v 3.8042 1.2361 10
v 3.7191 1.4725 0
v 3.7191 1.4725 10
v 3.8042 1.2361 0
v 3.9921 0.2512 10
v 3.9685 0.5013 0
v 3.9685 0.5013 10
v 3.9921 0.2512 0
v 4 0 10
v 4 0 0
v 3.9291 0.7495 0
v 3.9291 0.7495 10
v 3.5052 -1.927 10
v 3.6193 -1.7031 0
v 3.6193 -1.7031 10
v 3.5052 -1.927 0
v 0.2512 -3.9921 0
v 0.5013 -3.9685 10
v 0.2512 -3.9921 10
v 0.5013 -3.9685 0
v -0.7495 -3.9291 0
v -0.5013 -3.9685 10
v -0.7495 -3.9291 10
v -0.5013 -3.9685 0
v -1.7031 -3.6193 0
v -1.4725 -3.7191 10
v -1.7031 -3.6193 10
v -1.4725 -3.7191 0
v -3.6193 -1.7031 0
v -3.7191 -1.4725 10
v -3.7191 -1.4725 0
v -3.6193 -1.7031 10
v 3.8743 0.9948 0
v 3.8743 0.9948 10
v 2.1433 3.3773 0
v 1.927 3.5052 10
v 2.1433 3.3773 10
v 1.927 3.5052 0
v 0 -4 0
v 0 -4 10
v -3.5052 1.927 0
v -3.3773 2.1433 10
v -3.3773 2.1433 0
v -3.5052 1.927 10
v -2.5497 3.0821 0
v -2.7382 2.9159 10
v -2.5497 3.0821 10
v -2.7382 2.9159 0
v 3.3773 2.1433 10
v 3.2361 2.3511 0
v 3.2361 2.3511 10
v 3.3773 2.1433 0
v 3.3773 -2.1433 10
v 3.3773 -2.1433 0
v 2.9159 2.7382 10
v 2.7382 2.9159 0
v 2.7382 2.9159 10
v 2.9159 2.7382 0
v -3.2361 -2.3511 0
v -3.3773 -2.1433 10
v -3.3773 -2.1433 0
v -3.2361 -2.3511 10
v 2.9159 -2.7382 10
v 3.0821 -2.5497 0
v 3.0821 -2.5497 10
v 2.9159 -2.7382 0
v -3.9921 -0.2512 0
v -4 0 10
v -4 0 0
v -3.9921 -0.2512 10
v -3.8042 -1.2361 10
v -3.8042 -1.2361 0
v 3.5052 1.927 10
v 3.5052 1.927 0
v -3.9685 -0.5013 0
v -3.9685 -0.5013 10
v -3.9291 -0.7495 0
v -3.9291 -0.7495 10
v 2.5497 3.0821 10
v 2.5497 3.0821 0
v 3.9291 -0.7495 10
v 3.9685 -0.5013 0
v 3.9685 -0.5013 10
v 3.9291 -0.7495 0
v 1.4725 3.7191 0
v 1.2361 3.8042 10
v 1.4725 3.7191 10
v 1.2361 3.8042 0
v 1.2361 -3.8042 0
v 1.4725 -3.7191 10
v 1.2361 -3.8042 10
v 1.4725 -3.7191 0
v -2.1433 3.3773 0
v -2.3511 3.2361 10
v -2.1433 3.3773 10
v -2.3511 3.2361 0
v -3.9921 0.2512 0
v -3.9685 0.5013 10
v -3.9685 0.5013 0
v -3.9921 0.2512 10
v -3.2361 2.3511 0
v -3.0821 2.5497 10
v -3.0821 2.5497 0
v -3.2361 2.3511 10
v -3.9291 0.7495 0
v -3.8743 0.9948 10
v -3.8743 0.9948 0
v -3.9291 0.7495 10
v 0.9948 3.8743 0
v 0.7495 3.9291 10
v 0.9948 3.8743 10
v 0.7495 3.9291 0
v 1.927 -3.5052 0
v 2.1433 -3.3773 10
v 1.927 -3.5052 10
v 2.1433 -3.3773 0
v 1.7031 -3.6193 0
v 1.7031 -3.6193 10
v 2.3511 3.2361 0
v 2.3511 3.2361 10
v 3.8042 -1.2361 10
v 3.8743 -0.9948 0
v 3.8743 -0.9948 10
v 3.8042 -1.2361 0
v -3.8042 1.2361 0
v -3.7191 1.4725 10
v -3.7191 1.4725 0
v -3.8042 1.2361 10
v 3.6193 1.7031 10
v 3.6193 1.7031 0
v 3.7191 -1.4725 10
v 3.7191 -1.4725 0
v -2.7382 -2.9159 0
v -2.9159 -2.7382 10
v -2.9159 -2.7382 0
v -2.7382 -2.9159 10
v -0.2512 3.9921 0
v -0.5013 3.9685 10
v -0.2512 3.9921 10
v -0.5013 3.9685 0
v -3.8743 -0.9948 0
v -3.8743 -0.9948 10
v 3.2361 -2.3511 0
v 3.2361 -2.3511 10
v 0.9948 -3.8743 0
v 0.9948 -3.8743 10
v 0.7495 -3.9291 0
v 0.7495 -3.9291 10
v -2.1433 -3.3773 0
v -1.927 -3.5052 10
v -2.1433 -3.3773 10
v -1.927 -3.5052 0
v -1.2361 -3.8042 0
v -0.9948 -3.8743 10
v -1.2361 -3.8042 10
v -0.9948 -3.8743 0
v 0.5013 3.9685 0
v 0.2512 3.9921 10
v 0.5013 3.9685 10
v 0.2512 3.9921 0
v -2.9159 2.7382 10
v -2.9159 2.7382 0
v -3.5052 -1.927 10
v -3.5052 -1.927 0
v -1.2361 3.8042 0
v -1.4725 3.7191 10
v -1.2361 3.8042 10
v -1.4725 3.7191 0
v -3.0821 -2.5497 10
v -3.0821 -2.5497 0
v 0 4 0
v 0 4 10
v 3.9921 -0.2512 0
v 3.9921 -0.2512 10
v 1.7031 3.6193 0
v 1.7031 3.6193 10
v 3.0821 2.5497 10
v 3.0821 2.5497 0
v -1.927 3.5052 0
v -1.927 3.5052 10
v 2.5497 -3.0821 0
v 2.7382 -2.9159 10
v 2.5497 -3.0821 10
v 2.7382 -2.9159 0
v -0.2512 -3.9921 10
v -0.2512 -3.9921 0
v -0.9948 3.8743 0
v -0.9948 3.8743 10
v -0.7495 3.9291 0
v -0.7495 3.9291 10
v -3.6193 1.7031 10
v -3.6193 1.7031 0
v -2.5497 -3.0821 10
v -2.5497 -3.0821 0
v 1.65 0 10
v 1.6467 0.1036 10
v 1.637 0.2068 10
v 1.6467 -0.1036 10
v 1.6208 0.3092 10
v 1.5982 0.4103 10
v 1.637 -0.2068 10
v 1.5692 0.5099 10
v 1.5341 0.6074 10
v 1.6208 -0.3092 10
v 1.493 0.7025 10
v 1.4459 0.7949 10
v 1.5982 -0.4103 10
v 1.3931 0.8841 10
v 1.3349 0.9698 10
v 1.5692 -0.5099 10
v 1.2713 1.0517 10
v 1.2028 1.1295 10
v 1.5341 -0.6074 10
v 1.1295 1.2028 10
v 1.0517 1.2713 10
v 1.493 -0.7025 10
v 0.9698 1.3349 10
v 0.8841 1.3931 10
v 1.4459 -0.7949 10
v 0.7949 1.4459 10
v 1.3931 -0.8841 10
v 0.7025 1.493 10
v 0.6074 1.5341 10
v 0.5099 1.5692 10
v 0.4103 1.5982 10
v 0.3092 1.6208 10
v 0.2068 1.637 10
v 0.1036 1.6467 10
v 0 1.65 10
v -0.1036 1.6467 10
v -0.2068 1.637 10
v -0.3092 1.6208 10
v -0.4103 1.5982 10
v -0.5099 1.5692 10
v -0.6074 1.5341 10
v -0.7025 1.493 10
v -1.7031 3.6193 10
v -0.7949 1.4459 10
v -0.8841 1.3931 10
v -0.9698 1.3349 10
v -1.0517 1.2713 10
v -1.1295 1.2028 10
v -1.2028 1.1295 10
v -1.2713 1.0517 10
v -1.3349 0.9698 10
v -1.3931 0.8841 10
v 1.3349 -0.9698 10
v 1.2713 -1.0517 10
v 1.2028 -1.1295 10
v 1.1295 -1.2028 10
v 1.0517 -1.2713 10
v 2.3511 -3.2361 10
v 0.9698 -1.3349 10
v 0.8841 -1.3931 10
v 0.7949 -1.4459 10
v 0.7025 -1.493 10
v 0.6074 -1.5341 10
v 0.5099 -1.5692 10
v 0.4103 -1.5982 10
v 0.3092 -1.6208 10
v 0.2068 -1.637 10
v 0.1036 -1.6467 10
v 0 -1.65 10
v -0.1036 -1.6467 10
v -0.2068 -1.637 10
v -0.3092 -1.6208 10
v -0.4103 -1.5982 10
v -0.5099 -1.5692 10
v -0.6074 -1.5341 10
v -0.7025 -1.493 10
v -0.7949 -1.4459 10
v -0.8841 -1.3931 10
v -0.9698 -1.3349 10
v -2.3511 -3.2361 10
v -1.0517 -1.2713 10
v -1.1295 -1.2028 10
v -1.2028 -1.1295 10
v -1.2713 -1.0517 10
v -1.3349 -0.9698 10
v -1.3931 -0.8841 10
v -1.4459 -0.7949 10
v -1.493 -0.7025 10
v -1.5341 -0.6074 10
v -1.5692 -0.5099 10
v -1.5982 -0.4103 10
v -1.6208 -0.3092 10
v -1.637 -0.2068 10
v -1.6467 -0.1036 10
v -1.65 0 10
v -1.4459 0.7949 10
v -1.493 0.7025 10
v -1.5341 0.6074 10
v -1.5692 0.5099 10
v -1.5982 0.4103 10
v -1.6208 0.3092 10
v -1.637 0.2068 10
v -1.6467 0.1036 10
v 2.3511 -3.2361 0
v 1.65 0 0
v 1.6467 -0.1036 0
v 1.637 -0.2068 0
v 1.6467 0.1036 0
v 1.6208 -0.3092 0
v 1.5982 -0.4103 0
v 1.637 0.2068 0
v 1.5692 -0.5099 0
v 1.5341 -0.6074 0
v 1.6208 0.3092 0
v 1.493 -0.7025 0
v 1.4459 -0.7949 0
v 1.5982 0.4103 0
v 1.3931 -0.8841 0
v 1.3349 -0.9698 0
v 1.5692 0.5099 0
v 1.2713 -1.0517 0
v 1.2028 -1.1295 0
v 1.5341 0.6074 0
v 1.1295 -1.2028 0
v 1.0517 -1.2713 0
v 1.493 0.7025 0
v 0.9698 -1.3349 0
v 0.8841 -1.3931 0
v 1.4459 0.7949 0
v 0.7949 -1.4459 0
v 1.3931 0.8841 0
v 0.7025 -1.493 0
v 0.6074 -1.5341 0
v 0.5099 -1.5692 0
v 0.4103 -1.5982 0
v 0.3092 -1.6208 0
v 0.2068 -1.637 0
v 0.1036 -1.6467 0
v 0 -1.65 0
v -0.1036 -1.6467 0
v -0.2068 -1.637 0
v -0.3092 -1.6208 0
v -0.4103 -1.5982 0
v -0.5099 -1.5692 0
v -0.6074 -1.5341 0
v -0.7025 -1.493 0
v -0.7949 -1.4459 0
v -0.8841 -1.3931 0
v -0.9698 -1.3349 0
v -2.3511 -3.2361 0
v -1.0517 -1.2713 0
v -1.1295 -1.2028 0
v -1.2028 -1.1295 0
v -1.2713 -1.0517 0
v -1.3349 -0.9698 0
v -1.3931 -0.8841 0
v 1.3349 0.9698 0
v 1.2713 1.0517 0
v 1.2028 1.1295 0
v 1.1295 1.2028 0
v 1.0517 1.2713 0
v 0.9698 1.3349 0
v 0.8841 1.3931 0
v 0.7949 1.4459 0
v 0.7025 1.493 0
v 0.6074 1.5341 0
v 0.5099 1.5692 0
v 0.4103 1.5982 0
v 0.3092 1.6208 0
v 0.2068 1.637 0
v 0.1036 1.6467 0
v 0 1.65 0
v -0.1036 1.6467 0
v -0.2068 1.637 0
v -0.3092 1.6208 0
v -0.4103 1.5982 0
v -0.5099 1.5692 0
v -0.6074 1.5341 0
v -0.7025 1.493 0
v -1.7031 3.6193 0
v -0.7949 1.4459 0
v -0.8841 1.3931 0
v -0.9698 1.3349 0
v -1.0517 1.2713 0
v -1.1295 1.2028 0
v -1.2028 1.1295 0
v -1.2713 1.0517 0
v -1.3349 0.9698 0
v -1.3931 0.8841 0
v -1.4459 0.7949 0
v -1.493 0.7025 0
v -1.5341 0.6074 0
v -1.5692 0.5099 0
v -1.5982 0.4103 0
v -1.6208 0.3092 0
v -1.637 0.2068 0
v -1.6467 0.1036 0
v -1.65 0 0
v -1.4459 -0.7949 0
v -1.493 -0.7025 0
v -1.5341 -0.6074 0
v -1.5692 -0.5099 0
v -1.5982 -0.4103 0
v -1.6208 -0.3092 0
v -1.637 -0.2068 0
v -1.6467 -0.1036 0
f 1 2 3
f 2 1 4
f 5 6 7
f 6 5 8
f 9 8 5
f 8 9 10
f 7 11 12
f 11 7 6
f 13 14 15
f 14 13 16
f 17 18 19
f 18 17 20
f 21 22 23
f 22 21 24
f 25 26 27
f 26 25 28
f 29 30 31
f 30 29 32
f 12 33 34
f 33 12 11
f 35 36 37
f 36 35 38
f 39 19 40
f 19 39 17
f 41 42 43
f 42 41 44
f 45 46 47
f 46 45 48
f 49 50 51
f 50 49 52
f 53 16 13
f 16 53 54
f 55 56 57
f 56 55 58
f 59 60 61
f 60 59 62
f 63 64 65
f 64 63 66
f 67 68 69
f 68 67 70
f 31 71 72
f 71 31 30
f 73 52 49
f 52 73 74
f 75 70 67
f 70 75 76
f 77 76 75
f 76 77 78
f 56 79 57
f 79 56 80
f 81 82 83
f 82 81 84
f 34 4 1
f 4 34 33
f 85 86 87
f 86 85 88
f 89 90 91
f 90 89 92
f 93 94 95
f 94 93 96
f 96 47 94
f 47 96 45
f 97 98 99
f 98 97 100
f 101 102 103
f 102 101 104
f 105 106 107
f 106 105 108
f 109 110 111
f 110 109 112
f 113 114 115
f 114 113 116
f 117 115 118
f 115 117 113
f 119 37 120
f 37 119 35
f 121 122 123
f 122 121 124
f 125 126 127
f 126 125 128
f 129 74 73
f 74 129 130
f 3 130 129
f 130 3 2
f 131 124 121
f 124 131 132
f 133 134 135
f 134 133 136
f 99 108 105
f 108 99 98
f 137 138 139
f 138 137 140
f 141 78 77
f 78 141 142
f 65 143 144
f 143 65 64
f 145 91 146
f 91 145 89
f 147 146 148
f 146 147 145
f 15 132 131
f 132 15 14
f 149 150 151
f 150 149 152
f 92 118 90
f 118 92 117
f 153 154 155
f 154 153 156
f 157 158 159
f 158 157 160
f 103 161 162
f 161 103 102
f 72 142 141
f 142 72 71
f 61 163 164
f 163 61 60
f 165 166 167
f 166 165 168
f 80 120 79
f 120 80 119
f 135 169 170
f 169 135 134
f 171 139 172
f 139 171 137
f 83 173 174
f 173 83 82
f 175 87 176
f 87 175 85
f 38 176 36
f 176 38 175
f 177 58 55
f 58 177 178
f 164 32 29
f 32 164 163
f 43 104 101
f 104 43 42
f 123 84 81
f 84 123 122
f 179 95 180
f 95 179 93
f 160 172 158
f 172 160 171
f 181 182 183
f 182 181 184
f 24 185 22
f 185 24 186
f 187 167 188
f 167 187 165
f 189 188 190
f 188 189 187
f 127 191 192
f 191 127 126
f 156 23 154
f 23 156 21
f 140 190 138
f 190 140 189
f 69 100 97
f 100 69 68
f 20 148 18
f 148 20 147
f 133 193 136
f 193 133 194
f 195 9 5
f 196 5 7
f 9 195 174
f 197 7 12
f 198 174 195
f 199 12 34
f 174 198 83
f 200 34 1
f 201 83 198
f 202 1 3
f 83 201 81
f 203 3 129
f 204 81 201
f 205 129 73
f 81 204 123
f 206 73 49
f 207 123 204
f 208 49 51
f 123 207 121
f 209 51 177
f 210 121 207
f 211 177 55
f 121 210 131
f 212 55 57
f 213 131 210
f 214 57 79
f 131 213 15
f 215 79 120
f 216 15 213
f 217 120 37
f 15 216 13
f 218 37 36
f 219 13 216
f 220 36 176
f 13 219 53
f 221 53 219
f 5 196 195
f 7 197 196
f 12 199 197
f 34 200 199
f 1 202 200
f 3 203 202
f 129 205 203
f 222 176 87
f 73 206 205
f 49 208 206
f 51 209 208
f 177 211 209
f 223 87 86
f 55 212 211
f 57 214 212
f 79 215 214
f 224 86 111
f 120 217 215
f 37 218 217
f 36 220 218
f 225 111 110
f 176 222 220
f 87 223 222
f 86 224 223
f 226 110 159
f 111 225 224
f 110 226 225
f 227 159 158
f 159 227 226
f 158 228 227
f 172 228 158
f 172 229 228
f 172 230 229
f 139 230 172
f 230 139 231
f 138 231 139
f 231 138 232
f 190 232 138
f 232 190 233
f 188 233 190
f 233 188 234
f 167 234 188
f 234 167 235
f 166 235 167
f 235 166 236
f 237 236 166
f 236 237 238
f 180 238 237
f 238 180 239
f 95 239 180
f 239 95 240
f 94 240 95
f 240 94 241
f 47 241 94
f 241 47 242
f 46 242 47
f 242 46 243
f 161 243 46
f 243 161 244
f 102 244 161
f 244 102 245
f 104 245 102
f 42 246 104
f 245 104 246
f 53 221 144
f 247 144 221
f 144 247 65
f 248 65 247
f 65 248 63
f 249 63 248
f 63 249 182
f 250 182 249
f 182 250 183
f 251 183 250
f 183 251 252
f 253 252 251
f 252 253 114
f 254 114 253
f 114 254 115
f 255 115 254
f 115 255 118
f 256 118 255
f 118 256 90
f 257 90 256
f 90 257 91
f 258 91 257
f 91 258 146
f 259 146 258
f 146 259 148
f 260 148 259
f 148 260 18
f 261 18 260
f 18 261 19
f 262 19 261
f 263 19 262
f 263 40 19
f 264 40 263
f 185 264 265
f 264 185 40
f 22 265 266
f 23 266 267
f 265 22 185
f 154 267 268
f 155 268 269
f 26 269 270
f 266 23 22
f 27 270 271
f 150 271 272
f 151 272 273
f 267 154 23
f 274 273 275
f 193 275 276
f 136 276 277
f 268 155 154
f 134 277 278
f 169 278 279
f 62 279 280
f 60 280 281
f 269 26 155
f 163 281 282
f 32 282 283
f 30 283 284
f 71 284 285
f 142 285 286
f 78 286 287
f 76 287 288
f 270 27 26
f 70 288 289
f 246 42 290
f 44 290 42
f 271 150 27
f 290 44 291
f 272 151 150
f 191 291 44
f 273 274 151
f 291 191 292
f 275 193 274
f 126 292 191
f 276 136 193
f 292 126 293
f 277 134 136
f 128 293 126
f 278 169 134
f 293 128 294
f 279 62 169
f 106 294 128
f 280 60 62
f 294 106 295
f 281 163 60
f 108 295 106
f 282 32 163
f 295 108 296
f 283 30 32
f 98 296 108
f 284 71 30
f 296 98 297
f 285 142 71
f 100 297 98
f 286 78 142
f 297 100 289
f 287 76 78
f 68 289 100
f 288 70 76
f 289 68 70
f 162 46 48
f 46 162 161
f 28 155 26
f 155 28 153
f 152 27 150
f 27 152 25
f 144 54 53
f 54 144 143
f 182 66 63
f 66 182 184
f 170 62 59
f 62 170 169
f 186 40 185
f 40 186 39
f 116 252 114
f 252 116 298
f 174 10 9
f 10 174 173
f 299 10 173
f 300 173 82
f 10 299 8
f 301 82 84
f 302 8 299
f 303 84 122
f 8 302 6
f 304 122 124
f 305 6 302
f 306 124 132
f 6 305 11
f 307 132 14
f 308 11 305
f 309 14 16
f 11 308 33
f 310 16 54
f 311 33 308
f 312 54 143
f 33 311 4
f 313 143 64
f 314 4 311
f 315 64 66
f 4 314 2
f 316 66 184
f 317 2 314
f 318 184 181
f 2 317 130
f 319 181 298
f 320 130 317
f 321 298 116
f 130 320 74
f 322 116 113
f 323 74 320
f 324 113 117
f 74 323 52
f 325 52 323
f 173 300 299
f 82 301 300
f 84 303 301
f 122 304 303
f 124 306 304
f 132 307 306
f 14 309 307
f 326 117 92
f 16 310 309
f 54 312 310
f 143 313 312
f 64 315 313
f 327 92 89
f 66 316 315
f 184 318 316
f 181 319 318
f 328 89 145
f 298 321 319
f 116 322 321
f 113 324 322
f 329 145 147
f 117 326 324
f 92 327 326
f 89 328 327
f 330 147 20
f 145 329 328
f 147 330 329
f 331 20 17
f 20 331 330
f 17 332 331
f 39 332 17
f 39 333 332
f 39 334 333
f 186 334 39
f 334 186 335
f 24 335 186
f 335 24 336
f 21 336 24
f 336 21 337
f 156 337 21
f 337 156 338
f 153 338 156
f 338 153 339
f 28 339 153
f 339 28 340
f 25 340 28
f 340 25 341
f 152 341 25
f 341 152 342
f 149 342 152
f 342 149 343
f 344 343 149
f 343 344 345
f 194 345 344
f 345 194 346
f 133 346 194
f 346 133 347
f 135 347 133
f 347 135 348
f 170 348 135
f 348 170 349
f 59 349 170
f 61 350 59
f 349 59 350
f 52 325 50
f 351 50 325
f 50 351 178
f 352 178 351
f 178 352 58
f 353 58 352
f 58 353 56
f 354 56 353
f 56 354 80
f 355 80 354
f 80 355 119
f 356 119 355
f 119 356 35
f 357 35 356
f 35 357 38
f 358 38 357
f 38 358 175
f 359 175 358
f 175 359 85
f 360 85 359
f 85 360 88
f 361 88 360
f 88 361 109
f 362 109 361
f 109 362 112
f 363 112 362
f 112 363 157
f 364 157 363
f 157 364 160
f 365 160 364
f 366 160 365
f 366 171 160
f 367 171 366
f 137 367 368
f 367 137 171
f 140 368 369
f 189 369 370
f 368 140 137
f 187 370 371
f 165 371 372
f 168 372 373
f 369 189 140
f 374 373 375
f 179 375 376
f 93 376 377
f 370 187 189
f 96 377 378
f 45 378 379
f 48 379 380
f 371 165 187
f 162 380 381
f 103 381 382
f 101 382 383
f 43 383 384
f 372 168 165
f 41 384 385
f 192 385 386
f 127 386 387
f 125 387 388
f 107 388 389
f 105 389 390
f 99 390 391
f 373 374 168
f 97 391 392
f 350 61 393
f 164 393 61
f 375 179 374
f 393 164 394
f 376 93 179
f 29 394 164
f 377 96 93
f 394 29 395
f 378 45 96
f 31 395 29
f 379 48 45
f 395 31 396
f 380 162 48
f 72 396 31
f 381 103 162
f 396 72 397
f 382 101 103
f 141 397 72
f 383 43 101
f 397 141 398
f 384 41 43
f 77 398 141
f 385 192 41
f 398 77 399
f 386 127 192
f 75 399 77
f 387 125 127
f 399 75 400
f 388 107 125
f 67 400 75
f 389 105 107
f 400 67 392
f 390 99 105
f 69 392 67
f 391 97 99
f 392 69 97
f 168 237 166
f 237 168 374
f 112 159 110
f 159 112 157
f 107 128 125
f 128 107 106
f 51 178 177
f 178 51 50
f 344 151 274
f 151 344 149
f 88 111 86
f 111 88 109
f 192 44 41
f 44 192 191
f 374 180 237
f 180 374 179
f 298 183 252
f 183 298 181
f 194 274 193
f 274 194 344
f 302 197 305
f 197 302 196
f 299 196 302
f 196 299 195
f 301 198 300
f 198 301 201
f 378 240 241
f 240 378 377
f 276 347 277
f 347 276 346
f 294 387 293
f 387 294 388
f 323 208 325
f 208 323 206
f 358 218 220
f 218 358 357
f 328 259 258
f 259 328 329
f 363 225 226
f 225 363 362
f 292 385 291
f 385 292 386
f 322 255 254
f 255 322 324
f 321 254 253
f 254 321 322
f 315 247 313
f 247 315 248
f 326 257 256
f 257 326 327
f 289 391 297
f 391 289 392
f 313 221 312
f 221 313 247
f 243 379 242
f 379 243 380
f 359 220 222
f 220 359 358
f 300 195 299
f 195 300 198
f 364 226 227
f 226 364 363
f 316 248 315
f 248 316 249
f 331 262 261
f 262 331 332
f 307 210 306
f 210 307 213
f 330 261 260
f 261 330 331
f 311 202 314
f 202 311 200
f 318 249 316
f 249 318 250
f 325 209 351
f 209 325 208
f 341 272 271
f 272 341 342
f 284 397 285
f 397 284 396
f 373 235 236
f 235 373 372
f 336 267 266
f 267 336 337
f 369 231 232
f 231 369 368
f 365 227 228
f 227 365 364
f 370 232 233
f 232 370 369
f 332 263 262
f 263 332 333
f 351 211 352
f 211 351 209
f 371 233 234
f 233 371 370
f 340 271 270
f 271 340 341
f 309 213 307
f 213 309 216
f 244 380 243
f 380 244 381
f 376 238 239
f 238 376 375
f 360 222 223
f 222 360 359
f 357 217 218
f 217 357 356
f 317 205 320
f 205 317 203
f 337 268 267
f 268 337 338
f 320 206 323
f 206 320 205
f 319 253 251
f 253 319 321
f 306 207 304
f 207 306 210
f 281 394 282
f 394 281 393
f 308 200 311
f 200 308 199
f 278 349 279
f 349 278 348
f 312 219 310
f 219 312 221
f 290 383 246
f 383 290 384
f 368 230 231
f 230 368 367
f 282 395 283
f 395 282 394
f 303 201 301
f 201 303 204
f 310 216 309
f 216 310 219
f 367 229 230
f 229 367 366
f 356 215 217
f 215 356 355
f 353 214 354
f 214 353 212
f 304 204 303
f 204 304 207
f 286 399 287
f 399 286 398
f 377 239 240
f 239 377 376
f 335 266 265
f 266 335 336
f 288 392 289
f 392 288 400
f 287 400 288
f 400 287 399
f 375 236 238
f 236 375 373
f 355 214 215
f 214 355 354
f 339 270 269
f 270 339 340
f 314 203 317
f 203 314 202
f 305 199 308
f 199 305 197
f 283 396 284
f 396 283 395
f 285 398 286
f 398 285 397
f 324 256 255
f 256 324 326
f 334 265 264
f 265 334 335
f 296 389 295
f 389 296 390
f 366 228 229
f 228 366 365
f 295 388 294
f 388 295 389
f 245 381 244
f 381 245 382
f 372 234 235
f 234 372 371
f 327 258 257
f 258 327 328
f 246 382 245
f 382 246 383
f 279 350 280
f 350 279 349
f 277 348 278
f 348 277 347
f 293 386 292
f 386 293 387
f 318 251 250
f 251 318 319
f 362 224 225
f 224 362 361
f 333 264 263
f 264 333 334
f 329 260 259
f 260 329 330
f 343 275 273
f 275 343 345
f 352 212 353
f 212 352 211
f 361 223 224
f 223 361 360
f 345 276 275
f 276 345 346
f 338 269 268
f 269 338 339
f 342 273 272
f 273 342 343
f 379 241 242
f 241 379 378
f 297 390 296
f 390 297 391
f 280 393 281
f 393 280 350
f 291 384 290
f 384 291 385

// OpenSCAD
//simple pcb standoff library - By the DoomMeister

/*
Types will be through hole, captured nut, split column (with and without base)

v1 - First Release
v1.1 - Tidied Split Base
v1.2 - added support for end nut
v1.3 - Cleaned up a bit, allowing it to be used as both a customizer object and OpenSCAD library without changes (Marius Kintel <marius@kintel.net>)

This program is free software: you can redistribute it and/or modify
it under the terms of the GNU General Public License as published by
the Free Software Foundation, either version 3 of the License, or
(at your option) any later version.

This program is distributed in the hope that it will be useful,
but WITHOUT ANY WARRANTY; without even the implied warranty of
MERCHANTABILITY or FITNESS FOR A PARTICULAR PURPOSE. See the
GNU General Public License for more details.

You should have received a copy of the GNU General Public License
along with this program. If not, see <http://www.gnu.org/licenses/>.
*/

include<MCAD/metric_fastners.scad>

//>>>>>>>>>>>>>>>>>>>>>>>>>>>>>>>>>>>>>>>>>>>>>>>>>>>>>>>>>>>>>>>>>>>>>>>>>>>
//usage
//>>>>>>>>>>>>>>>>>>>>>>>>>>>>>>>>>>>>>>>>>>>>>>>>>>>>>>>>>>>>>>>>>>>>>>>>>>>
/*
pcb_stand_off(
              type="plain",  THIS IS THE TYPE OF STAND OFF plain, end_nut, split_base 
	      hex=true, 		THIS IS THE OUTSIDE SHAPE IS IT HEXAGONAL OR ROUND,NOT USED ON SPLIT TYPE
	      od = 10, 		OUTSIDE DIAMETER
	      id = 3,        THREAD SIZE FOR INNER DIAMETER, HOLE SIZE FOR SPLIT TYPE
	      len = 12, 		LENGTH, SUPPORT HEIGHT FOR SPLIT TYPE
	      cl=0.3,  		CLEARANCE
	      thk_base,		BASE THICKNESS FOR SPLIT TYPE
	      thk_pcb);		PCB THICKNESS
*/

//>>>>>>>>>>>>>>>>>>>>>>>>>>>>>>>>>>>>>>>>>>>>>>>>>>>>>>>>>>>>>>>>>>>>>>>>>>>
//Customiser Stuff
//>>>>>>>>>>>>>>>>>>>>>>>>>>>>>>>>>>>>>>>>>>>>>>>>>>>>>>>>>>>>>>>>>>>>>>>>>>>

//Plain, Retained Nut or Split Pillar With Base
Stand_Off_Type = "plain"; // [plain:Plain, end_nut:Captive Nut, split_base:Screwless]
//Round or Hex Outside
Outside_Shape = 0; // [0:Circular, 1:Hexagonal]
// in mm
Outside_Diameter = 8;
// Thread Size in mm
Inside_Diameter = 3;
// PCB Spacing
Length = 10;
// PCB hole clearance
Clearance = 0.3;
// screwless variant only
Base_Thickness = 1.5;
// screwless variant only
PCB_Thickness = 1.5;

//Thing
pcb_stand_off(type=Stand_Off_Type,
              hex=Outside_Shape,
              od = Outside_Diameter,
              id = Inside_Diameter,
              len = Length,
              cl=Clearance,
              thk_base=Base_Thickness,
              thk_pcb=PCB_Thickness);

//>>>>>>>>>>>>>>>>>>>>>>>>>>>>>>>>>>>>>>>>>>>>>>>>>>>>>>>>>>>>>>>>>>>>>>>>>>>
//draw test
//>>>>>>>>>>>>>>>>>>>>>>>>>>>>>>>>>>>>>>>>>>>>>>>>>>>>>>>>>>>>>>>>>>>>>>>>>>>
/*
spaceing = 15*1;
translate([0*spaceing,0*spaceing,0])color("red")pcb_stand_off(type="plain",hex=true, od = 10, id = 3, len = 12, cl=0.3,thk_base=3,thk_pcb=1.5);
translate([1*spaceing,0*spaceing,0])color("green")pcb_stand_off(type="end_nut",hex=false, od = 10, id = 3, len = 12, cl=0.3);
translate([1*spaceing,1*spaceing,0])color("blue")pcb_stand_off(type="split_base", od = 10, id = 3, len = 8, cl=0.3, thk_base=1.5,thk_pcb=1.5);
*/

//>>>>>>>>>>>>>>>>>>>>>>>>>>>>>>>>>>>>>>>>>>>>>>>>>>>>>>>>>>>>>>>>>>>>>>>>>>>
//outer module
//>>>>>>>>>>>>>>>>>>>>>>>>>>>>>>>>>>>>>>>>>>>>>>>>>>>>>>>>>>>>>>>>>>>>>>>>>>>

module pcb_stand_off(type="plain",hex=false, od = 8, id = 3, len = 8, cl=0.3,thk_base=3,thk_pcb=1.5)
{
    if (type=="plain") {
	if (hex) stand_off_hex(_od=od, _id = id,_len = len,_cl = cl);
	else stand_off(_od=od, _id = id,_len = len,_cl = cl);
    }
    if (type=="end_nut") {
	if (hex) end_nut_stand_off_hex(_od=od, _id = id,_len = len,_cl = cl);
        else end_nut_stand_off(_od=od, _id = id,_len = len,_cl = cl);
    }
    if (type=="split_base") {
	split_base_stand_off(_od=od, _id = id,_len = len,_cl = cl,_thk_base=thk_base,_thk_pcb=thk_pcb);
    }
}

//>>>>>>>>>>>>>>>>>>>>>>>>>>>>>>>>>>>>>>>>>>>>>>>>>>>>>>>>>>>>>>>>>>>>>>>>>>>
//inner modules
//>>>>>>>>>>>>>>>>>>>>>>>>>>>>>>>>>>>>>>>>>>>>>>>>>>>>>>>>>>>>>>>>>>>>>>>>>>>

module end_nut_stand_off(_od=2, _id = 2,_len = 8,_cl = 0.3)
{
    union() {
	difference() {
	    cylinder(r = _od/2, h = _len, $fn=100);
	    translate([0,0,-1])cylinder(r = (_id + _cl)/2, h = _len+2, $fn=100);
	    translate([0,0,0])flat_nut(_id+_cl,apply_chamfer=false);
	    translate([0,0,_len-(0.8*(_id+_cl))+.01])flat_nut(_id+_cl,apply_chamfer=false);
	}
	translate([0,0,(0.8*(_id+_cl))])cylinder(r = _od/2, h = 0.25, $fn=100);
    }
}
module end_nut_stand_off_hex(_od=2, _id = 2,_len = 8,_cl = 0.3)
{
    union() {
	difference() {
	    cylinder(r = _od/2, h = _len, $fn=6);
	    translate([0,0,-1])cylinder(r = (_id + _cl)/2, h = _len+2, $fn=100);
	    translate([0,0,0])flat_nut(_id+_cl,apply_chamfer=false);
	    translate([0,0,_len-(0.8*(_id+_cl))+.01])flat_nut(_id+_cl,apply_chamfer=false);
	}
	translate([0,0,(0.8*(_id+_cl))])cylinder(r = _od/2, h = 0.25, $fn=6);
    }
}
module stand_off(_od=2, _id = 2,_len = 8,_cl = 0.3)
{
    difference() {
	cylinder(r = _od/2, h = _len, $fn=100);
	translate([0,0,-1])cylinder(r = (_id + _cl)/2, h = _len+2, $fn=100);
    }
}

module stand_off_hex(_od=2, _id = 2,_len = 8,_cl = 0.3)
{
    difference() {
	cylinder(r = _od/2, h = _len, $fn=6);
	translate([0,0,-1])cylinder(r = (_id + _cl)/2, h = _len+2, $fn=100);

    }
}

module split_base_stand_off(_od=12, _id = 2,_len = 8,_cl = 0.3,_thk_base=3,_thk_pcb=1.5)
{
    //tunables
    _top_len = 3;
    _sup_d = 2;
    _sup_ang = 30;
    //extra calcs
    _split_w=_id/3;
    _ol_len = _len+_thk_pcb+_top_len+(2*_cl);
    _sup_len = ((_sup_d/2)/tan(_sup_ang));
    _pil_d = (_id-_cl)/2;
    echo(_sup_len);
    difference() {
	union() {
	    cylinder(r = _od/2, h = _thk_base, $fn=100);
	    cylinder(r = _pil_d, h = _ol_len, $fn=100);
	    translate([0,0,_len-_sup_len])cylinder(r1 = _pil_d, r2 = (_id+_sup_d)/2, h = _sup_len, $fn=100);
	    translate([0,0,_len+_thk_pcb+(_cl)])cylinder(r1 = _pil_d, r2 = (_id+(1.1*_cl))/2, h = _cl, $fn=100);
	    translate([0,0,_len+_thk_pcb+(2*_cl)])cylinder(r1 = (_id+(1.1*_cl))/2, r2 = _pil_d, h = _top_len, $fn=100);
	}
	
	translate([-(_id+_sup_d)/2,-_split_w/2,_len-_sup_len+_split_w])
	cube([_id+_sup_d,_split_w,_sup_len+_thk_pcb+_top_len+_cl]);
	translate([-(_id+_sup_d)/2,0,_len-_sup_len+_split_w])
	rotate([0,90,0])
	cylinder(r=_split_w/2, h=_id+_sup_d, $fn=100);		
    }
}
